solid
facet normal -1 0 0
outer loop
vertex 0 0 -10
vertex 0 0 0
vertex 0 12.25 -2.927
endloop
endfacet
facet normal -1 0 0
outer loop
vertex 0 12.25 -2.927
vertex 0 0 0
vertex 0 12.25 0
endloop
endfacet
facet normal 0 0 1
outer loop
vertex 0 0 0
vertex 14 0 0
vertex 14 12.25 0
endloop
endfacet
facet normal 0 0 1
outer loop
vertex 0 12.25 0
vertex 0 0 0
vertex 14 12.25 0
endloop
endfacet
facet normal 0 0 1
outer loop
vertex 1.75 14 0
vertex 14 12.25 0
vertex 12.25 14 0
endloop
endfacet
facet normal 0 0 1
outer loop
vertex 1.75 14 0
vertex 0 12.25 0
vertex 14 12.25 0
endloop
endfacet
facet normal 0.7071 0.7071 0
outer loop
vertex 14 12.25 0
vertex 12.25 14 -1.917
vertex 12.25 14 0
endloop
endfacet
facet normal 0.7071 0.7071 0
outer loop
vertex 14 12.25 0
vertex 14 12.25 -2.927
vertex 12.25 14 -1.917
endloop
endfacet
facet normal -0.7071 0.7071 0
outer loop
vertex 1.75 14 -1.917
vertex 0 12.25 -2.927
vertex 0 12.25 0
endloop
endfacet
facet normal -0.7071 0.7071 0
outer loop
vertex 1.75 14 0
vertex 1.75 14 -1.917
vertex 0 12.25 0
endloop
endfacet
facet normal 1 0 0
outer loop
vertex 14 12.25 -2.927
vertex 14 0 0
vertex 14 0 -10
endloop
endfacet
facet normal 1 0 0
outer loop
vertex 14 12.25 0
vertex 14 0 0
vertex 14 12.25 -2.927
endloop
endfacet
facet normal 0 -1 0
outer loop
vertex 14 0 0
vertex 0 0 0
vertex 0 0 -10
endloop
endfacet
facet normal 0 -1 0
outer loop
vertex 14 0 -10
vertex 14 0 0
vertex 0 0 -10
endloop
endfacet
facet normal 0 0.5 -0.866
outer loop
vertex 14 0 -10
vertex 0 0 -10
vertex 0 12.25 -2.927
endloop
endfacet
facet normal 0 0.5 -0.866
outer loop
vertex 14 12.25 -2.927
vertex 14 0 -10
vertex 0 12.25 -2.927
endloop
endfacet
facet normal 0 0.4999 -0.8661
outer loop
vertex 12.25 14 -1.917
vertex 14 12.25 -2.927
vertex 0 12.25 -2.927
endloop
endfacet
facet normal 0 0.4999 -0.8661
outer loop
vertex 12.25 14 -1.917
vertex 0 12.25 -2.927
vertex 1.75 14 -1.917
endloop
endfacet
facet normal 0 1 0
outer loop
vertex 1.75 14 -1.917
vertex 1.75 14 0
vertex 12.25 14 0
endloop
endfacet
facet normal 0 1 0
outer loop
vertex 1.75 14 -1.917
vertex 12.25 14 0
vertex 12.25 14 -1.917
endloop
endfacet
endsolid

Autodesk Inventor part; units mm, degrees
ref_plane "YZ Plane" through (0, 0, 0) normal (1, 0, 0) x (0, 1, 0)
ref_plane "XZ Plane" through (0, 0, 0) normal (0, 1, 0) x (-1, 0, 0)
ref_plane "XY Plane" through (0, 0, 0) normal (0, 0, 1) x (1, 0, 0)
sketch "Sketch1" plane through (0, 0, 0) normal (1, 0, 0) x (0, 1, 0)
  line L0 (20, 0) -> (-20, 0) construction
  line L1 (0, 20) -> (0, -20) construction
  line L2 (0, 0) -> (0, -10)
  line L3 (0, 0) -> (14, 0)
  line L4 (0, -10) -> (14, -1.9171)
  line L5 (14, 0) -> (14, -1.9171)
  dimension "d1" = 40
  dimension "d2" = 40
  dimension "d5" = 90
  dimension "d6" = 60
  dimension "d7" = 30
  dimension "d8" = 10
  dimension "squared_surface" = 14
extrude "Extrusion1" add sketch "Sketch1" along normal blind 14
chamfer "Chamfer1" distance 1.75 angle 45 1 edges at (0, 14, -0.9585)
chamfer "Chamfer2" distance 1.75 angle 45 1 edges at (14, 14, -0.9585)
equation "\"d10\" = squared_surface"
properties part number "anamorphic_prism_caf2" material "Glass"
